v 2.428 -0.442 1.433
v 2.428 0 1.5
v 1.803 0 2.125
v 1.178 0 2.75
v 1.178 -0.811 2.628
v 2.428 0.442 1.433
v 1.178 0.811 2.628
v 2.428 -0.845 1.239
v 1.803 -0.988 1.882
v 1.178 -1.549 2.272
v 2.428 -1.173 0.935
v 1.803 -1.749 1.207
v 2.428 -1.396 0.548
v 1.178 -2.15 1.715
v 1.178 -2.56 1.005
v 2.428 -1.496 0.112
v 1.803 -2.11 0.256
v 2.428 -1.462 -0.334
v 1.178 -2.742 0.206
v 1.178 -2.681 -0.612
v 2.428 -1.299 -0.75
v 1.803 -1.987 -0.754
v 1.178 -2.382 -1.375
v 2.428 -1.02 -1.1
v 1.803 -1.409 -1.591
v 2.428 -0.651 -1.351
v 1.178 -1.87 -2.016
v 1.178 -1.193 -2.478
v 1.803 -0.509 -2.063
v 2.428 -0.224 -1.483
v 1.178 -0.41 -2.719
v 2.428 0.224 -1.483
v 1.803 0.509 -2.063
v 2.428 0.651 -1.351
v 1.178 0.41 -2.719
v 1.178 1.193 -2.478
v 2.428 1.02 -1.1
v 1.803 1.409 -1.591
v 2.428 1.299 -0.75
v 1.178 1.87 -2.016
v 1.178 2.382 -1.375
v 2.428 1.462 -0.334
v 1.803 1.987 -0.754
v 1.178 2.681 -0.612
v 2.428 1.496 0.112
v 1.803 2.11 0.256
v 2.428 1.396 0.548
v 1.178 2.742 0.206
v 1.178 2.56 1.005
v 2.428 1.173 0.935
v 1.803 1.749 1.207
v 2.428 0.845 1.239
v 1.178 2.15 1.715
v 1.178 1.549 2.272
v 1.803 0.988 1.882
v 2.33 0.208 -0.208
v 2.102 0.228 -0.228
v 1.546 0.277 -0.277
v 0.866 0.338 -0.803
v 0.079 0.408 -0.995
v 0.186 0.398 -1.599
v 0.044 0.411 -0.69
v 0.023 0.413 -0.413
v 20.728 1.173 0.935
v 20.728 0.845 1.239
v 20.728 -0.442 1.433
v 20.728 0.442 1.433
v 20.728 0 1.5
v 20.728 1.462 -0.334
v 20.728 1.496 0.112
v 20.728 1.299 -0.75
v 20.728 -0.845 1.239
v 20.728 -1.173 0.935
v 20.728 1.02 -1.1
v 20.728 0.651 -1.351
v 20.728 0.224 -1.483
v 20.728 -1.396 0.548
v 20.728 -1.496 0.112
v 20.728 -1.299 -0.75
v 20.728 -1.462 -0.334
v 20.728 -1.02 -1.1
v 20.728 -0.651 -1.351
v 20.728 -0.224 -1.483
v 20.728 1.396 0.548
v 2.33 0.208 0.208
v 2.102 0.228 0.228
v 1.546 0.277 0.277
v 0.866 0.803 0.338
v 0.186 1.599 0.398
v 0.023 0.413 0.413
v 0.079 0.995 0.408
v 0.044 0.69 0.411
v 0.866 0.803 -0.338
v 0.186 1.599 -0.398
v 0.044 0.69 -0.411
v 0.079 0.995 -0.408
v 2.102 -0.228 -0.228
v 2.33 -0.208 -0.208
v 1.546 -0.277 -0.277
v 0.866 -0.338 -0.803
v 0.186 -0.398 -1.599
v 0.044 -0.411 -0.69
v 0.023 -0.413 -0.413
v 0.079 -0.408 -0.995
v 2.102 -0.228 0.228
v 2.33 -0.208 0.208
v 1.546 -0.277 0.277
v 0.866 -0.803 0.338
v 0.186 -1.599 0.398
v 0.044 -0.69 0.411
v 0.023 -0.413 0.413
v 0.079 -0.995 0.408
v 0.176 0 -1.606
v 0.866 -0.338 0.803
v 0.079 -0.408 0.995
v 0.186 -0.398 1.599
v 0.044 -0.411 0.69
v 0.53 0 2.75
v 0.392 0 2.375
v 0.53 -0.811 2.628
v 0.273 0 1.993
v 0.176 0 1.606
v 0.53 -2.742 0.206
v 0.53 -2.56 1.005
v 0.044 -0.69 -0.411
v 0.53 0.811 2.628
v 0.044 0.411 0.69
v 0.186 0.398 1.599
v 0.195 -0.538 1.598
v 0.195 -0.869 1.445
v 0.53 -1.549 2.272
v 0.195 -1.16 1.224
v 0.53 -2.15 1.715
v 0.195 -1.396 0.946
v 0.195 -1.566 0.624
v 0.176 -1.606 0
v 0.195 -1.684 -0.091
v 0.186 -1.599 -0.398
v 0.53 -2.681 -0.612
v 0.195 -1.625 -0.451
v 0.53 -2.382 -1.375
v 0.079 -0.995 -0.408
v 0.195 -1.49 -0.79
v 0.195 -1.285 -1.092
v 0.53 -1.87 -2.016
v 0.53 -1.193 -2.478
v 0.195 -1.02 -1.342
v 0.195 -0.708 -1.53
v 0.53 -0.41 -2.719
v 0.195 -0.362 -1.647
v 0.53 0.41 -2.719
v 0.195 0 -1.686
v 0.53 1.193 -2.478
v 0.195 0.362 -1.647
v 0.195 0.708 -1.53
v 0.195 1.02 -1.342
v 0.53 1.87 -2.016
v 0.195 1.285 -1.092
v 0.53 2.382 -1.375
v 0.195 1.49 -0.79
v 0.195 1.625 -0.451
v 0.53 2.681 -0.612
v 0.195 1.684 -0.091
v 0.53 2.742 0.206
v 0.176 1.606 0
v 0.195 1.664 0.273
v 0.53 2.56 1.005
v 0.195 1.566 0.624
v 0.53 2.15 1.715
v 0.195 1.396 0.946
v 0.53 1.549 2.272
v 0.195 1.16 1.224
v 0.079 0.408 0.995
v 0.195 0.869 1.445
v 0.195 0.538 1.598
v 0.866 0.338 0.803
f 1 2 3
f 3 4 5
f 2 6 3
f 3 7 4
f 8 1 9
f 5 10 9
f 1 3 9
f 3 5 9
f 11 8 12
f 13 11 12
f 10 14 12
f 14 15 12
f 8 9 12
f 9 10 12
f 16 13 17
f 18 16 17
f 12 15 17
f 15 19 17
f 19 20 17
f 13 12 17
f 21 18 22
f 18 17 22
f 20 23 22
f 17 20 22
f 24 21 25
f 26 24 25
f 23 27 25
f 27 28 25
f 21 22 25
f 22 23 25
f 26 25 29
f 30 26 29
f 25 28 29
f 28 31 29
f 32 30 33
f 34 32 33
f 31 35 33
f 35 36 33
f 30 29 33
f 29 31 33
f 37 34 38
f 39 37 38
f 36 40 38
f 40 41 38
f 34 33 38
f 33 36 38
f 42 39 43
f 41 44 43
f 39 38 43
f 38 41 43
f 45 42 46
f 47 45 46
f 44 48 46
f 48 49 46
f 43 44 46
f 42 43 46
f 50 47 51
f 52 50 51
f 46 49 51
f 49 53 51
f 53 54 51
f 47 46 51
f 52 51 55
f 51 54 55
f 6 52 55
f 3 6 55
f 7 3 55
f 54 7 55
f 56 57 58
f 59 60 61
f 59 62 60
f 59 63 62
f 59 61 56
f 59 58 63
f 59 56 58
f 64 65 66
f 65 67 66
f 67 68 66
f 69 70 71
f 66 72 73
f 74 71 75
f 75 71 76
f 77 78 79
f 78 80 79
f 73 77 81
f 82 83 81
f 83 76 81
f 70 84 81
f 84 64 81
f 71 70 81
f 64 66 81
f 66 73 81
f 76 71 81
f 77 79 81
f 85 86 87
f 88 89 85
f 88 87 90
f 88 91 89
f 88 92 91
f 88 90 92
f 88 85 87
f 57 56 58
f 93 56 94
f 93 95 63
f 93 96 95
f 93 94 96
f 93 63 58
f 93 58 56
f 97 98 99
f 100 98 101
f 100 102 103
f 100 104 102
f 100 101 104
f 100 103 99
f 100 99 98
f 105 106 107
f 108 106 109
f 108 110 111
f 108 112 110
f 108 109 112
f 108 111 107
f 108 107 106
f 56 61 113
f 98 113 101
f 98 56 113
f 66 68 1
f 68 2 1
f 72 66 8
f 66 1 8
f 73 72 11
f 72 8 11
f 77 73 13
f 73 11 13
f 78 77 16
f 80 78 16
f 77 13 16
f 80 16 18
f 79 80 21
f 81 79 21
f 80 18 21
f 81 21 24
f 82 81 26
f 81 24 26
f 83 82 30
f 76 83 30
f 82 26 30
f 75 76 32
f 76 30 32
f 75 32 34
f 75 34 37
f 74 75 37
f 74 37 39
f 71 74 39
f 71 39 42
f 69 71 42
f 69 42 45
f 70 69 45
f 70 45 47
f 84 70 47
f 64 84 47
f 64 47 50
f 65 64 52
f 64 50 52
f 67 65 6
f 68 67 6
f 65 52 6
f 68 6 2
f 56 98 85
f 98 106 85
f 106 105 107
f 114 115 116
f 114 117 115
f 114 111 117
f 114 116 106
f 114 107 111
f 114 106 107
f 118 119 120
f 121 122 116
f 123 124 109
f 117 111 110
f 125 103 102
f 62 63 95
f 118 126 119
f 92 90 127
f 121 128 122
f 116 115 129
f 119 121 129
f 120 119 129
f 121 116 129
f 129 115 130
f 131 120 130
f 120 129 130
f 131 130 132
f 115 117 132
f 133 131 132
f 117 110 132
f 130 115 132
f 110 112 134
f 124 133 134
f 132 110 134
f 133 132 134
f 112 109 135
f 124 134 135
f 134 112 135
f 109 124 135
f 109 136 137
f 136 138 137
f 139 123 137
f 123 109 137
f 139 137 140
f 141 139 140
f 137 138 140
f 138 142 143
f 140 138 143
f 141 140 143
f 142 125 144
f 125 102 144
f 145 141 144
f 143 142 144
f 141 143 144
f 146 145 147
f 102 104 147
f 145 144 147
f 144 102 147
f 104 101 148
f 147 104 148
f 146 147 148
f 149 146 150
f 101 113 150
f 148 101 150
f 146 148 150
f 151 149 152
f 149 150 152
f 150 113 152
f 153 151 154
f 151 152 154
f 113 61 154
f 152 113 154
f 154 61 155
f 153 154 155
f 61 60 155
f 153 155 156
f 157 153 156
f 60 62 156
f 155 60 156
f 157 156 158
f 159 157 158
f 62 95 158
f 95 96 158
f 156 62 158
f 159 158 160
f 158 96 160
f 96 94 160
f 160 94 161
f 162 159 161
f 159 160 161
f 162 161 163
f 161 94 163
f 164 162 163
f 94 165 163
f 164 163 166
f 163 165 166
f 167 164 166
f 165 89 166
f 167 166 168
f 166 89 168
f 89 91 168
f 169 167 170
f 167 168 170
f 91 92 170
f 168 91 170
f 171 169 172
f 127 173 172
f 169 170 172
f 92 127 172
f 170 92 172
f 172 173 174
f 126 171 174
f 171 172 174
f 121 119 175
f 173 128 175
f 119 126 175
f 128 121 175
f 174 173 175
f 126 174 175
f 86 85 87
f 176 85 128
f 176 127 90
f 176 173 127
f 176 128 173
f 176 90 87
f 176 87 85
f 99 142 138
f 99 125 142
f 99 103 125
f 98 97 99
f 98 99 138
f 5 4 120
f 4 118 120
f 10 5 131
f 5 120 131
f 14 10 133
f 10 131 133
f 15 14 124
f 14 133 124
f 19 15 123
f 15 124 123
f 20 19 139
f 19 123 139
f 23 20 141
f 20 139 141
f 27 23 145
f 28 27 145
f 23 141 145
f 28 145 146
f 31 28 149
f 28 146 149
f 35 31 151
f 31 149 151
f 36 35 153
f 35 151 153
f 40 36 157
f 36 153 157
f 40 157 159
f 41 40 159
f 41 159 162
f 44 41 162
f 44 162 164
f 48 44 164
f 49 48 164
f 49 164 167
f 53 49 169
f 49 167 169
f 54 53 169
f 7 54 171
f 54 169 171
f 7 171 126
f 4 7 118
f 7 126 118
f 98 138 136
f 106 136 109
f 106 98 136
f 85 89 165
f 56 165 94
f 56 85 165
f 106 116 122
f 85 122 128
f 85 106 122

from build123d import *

# Parameters (mm, degrees)
CIRPATTERN1_COUNT = 2
CIRPATTERN1_ANGLE = 90


with BuildPart() as part:
    # BodySke → Base-Revolve (revolve)
    with BuildSketch(Plane.XY, mode=Mode.PRIVATE) as base_revolve_sk:
        with BuildLine():
            Line((0, 0), (20.727669073, 0))
            Line((20.727669073, 0), (20.727669073, 1.5))
            Line((20.727669073, 1.5), (2.427669073, 1.5))
            Line((2.427669073, 1.5), (1.177669073, 2.75))
            Line((1.177669073, 2.75), (0.529956332, 2.75))
            ThreePointArc((0.529956332, 2.75), (0.133696843, 1.400299407), (0, 0))
        make_face()
    revolve(base_revolve_sk.sketch.rotate(Axis((-15.875, 0, 0), (1, 0, 0)), 90), axis=Axis((-15.875, 0, 0), (1, 0, 0)))

    # Sketch3 → Cross section 0
    with BuildSketch(Plane(origin=(0, 0, 0), x_dir=(0, 0, -1), z_dir=(1, 0, 0))):
        with BuildLine():
            Line((0.415, -1.72), (-0.415, -1.72))
            Line((-0.415, -1.72), (-0.415, 1.72))
            Line((-0.415, 1.72), (0.415, 1.72))
            Line((0.415, 1.72), (0.415, -1.72))
        make_face()
    # Sketch4 → Cross section 1
    with BuildSketch(Plane(origin=(2.33, 0, 0), x_dir=(0, 0, -1), z_dir=(1, 0, 0))):
        with BuildLine():
            Line((0.2075, -0.2075), (-0.2075, -0.2075))
            Line((-0.2075, -0.2075), (-0.2075, 0.2075))
            Line((-0.2075, 0.2075), (0.2075, 0.2075))
            Line((0.2075, 0.2075), (0.2075, -0.2075))
        make_face()
    cross = loft(mode=Mode.SUBTRACT)

    # CirPattern1: Cross ×2 about axis
    cirpattern1_axis = Axis((0, 0, 0), (1, 0, 0))
    for i in range(1, CIRPATTERN1_COUNT):
        add(cross.rotate(cirpattern1_axis, i * CIRPATTERN1_ANGLE / (CIRPATTERN1_COUNT - 1)), mode=Mode.SUBTRACT)


solid = part.part
